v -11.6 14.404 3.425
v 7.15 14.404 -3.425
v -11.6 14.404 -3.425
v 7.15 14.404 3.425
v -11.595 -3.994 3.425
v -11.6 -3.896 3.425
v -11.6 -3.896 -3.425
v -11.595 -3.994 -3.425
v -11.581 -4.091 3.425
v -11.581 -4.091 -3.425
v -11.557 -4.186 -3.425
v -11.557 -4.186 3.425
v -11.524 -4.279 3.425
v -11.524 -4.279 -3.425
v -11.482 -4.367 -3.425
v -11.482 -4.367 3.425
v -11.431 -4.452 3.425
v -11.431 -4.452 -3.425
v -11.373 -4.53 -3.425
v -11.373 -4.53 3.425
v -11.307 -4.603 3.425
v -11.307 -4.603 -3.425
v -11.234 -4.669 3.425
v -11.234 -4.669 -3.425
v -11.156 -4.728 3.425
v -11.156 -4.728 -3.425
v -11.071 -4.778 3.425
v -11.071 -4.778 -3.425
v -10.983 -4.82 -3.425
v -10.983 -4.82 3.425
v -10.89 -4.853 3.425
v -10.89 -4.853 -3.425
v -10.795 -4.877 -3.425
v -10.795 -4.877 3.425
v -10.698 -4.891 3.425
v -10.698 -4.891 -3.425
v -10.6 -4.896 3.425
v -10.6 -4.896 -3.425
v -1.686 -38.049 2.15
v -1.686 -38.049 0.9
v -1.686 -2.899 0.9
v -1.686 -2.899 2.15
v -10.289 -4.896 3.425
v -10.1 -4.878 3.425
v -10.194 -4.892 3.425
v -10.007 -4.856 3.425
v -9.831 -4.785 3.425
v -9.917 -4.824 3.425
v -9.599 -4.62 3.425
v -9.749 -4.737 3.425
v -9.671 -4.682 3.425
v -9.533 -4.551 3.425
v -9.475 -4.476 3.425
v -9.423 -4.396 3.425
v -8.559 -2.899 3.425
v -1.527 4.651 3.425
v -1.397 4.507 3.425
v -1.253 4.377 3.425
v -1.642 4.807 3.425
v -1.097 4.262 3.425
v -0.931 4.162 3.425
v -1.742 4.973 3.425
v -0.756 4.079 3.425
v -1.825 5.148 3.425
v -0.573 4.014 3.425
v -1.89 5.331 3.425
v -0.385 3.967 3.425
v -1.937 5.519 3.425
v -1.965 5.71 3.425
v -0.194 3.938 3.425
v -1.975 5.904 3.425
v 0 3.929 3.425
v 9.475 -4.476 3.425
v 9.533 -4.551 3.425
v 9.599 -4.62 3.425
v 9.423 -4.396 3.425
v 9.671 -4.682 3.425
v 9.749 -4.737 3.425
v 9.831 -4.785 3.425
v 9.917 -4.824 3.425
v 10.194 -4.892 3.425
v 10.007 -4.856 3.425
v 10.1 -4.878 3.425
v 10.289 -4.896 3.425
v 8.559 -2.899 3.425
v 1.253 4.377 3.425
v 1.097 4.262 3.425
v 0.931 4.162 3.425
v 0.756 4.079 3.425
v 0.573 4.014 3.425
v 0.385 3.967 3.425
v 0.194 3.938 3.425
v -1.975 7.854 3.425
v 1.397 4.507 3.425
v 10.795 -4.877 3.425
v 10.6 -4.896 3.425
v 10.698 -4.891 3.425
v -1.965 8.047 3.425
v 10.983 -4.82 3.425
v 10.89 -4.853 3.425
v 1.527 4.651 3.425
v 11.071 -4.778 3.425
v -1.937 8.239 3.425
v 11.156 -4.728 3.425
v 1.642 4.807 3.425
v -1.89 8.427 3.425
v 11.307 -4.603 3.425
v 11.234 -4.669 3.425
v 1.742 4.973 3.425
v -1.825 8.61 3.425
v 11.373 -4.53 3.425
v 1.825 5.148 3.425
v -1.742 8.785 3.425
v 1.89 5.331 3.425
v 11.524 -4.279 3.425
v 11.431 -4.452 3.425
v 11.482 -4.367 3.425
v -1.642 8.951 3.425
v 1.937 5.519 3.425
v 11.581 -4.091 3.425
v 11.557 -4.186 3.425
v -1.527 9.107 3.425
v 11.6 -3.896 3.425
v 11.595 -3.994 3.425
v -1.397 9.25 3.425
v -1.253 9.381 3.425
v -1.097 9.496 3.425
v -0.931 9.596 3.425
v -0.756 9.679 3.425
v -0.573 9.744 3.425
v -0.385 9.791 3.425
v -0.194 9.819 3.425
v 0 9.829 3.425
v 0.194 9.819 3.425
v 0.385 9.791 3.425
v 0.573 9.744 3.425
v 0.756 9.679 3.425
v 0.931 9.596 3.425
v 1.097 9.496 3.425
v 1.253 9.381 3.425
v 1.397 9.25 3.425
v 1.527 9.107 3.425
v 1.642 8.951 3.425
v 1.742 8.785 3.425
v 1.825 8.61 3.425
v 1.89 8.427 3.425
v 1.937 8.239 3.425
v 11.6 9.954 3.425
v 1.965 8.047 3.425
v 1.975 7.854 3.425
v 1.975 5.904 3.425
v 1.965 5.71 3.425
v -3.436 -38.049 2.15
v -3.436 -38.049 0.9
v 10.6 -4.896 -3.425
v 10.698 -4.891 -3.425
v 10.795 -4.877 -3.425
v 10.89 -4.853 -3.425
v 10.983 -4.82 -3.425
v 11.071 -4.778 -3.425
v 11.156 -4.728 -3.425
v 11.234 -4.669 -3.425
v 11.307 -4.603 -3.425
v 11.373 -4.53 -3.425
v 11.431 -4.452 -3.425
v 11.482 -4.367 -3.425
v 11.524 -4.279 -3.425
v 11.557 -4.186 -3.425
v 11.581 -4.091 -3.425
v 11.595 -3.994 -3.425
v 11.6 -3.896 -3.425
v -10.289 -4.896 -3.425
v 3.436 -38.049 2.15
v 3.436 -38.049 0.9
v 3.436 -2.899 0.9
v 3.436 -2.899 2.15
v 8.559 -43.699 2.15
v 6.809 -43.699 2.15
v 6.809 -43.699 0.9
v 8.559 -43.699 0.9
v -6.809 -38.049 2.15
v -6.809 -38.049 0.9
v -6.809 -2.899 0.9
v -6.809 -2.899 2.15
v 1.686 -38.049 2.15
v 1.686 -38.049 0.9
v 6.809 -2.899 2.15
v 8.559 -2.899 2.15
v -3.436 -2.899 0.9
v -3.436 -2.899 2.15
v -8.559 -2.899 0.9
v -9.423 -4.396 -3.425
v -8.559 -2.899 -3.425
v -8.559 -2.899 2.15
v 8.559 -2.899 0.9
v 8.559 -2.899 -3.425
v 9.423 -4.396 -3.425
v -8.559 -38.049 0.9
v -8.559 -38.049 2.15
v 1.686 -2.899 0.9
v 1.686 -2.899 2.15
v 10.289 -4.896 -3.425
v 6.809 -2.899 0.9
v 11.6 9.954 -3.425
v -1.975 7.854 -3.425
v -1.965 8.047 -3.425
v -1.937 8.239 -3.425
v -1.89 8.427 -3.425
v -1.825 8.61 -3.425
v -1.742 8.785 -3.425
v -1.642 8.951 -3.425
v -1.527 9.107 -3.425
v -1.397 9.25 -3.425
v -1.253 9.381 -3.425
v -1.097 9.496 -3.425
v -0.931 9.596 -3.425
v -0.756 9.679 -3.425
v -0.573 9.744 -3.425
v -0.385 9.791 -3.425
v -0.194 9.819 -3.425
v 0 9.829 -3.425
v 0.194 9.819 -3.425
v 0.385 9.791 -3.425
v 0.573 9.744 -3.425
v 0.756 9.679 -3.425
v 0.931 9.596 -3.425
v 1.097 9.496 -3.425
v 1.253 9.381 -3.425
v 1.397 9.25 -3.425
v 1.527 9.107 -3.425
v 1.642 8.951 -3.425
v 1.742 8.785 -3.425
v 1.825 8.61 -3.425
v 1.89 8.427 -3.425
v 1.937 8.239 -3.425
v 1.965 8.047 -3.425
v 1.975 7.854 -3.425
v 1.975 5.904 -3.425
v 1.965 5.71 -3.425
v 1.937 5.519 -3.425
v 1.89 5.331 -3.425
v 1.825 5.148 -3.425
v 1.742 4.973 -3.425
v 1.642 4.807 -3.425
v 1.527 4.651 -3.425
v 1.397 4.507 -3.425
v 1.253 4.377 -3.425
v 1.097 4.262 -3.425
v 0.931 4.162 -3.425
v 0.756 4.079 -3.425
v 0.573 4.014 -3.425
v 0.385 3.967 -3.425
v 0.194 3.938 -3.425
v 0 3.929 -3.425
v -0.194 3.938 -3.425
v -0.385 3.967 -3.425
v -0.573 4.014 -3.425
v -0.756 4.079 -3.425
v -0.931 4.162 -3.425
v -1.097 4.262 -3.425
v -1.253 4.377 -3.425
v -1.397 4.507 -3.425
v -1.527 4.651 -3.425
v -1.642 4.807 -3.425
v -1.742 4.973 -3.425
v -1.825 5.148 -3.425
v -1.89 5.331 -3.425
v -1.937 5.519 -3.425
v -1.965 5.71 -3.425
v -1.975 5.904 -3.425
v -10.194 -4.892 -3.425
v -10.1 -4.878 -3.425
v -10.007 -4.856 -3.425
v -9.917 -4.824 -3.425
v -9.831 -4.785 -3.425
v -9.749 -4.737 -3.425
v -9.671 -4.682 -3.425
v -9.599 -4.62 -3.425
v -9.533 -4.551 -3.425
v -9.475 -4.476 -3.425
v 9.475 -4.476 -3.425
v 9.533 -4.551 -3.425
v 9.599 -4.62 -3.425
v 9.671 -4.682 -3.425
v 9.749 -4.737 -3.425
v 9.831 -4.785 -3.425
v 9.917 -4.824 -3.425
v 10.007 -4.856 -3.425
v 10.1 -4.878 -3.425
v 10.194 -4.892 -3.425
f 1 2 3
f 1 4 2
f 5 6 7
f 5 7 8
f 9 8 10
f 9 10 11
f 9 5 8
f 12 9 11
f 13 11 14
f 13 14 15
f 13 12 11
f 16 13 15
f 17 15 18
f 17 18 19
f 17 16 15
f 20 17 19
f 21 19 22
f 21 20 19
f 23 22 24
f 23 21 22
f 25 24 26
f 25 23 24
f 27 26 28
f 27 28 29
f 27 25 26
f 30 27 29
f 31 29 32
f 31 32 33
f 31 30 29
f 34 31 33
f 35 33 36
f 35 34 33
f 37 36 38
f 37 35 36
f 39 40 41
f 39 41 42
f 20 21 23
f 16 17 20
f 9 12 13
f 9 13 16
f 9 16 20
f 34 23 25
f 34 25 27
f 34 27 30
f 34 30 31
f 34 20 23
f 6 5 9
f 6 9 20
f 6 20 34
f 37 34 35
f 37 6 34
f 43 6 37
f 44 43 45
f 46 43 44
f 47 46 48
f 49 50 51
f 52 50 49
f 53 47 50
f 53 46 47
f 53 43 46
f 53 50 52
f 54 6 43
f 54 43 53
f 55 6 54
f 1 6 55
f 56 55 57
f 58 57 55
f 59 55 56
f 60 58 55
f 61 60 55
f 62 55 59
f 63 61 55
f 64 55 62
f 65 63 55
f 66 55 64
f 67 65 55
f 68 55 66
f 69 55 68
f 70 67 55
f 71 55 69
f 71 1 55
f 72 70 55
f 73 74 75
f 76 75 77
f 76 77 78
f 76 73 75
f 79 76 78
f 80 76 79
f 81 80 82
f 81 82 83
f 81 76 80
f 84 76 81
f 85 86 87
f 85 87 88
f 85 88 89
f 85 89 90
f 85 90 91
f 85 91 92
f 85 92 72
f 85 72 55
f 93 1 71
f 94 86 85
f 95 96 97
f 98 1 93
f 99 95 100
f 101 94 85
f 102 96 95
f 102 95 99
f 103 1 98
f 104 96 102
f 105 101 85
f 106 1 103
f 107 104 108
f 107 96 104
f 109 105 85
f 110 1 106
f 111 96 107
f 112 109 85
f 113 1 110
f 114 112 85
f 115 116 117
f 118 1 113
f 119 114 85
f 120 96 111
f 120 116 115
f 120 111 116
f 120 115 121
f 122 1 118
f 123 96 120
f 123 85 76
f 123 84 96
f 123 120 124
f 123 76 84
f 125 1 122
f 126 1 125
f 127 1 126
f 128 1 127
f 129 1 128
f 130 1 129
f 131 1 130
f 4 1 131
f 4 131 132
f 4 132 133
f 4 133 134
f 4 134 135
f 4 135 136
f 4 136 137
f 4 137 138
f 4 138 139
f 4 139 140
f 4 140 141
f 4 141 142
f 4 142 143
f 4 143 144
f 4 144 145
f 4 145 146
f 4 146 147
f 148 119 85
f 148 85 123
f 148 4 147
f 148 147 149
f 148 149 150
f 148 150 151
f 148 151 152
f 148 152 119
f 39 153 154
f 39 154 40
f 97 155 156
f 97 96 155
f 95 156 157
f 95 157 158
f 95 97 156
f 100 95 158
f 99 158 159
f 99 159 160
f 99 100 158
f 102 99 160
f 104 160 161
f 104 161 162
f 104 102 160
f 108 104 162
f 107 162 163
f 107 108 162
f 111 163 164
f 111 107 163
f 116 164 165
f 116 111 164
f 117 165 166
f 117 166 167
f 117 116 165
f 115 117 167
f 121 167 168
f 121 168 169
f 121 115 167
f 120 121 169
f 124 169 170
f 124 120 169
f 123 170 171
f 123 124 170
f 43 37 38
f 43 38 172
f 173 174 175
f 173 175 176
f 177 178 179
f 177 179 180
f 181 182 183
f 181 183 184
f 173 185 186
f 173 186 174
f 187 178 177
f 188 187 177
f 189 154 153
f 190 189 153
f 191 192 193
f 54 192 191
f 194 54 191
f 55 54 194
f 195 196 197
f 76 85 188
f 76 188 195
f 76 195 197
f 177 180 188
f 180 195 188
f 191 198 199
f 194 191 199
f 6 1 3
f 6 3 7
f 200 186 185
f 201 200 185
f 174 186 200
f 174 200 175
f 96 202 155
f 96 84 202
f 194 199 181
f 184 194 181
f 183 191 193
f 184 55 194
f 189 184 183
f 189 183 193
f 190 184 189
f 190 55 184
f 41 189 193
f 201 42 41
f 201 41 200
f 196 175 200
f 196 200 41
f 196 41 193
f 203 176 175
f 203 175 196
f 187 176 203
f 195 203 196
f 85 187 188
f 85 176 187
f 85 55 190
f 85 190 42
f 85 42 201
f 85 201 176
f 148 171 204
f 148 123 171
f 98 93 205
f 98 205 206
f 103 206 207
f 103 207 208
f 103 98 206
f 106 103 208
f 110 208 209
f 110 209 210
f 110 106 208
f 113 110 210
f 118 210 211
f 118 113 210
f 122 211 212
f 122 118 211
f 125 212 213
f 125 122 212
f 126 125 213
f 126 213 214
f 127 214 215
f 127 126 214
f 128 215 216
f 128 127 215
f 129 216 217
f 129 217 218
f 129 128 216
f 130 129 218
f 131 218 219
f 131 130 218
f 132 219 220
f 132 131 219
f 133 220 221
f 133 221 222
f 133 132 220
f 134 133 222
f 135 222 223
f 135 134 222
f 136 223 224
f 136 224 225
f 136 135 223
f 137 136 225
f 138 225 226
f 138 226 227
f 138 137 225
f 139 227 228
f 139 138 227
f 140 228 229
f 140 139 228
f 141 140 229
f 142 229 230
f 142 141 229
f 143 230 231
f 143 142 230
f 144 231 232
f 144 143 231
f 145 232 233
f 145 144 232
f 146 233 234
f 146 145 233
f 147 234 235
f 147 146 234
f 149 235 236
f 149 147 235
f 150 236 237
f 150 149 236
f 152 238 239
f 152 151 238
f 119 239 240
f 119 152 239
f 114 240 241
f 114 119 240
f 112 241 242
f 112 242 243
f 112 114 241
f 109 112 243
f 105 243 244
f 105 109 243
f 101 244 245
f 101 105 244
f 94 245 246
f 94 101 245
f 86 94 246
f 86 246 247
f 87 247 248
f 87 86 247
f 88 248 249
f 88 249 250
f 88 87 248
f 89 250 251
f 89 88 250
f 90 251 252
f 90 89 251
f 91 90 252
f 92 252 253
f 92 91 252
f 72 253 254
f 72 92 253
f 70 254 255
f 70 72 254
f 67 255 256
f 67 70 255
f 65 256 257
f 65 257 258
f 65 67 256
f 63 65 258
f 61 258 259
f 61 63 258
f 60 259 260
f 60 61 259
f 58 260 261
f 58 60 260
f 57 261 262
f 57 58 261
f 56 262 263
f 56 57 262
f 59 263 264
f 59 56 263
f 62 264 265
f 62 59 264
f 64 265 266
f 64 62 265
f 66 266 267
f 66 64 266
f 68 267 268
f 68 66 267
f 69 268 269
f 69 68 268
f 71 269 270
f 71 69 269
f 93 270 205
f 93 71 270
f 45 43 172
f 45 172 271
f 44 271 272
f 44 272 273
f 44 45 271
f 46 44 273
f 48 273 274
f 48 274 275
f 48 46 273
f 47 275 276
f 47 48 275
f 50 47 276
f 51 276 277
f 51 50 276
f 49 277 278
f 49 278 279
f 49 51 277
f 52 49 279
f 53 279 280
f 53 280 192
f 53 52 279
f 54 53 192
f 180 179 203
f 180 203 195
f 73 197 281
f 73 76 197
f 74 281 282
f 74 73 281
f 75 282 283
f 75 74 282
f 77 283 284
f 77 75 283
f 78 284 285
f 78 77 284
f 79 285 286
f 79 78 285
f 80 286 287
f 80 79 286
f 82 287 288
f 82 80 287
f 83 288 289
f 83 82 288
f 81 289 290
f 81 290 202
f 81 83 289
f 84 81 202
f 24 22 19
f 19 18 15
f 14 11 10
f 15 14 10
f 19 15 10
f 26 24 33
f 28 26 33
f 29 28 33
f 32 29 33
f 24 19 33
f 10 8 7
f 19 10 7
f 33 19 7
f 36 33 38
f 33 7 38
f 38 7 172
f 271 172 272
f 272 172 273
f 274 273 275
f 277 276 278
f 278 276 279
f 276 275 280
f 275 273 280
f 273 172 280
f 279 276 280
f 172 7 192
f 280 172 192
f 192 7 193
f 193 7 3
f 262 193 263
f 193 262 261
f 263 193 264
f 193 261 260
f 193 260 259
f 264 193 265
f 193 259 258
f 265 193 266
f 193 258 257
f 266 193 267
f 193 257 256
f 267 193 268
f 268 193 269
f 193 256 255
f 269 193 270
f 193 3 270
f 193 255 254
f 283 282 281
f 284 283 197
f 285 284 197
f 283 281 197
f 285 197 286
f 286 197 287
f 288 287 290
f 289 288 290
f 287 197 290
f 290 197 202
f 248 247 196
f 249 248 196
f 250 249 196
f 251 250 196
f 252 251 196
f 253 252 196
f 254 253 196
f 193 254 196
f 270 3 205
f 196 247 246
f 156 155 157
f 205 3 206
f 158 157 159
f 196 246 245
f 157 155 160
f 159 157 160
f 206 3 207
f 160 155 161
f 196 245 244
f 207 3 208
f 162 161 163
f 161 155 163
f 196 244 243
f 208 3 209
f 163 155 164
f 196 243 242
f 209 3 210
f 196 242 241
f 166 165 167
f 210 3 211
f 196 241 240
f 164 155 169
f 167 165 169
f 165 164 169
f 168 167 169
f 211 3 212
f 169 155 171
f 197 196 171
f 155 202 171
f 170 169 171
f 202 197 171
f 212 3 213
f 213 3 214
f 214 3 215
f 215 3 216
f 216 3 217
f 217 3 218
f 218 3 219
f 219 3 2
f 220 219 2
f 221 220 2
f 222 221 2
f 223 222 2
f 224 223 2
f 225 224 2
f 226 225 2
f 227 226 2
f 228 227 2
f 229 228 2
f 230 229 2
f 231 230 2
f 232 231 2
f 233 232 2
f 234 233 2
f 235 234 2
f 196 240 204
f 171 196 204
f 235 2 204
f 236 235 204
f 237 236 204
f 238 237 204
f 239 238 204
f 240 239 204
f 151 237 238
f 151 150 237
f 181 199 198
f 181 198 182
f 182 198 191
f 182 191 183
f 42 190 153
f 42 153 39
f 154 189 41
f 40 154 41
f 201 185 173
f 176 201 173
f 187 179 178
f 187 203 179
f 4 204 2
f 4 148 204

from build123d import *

# Parameters (mm, degrees)
BOSS_EXTRUDE1_DEPTH = 3.425
SKETCH2_W           = 1.75
SKETCH2_H           = 1.25
BOSS_EXTRUDE2_DEPTH = 35.15
SKETCH3_W           = 1.75
SKETCH3_H           = 1.25
BOSS_EXTRUDE3_DEPTH = 5.65


with BuildPart() as part:
    # Sketch1 → Boss-Extrude1 (new, symmetric)
    with BuildSketch(Plane.XY):
        with BuildLine():
            Line((7.15, 14.403910503), (-11.6, 14.403910503))
            Line((-11.6, 14.403910503), (-11.6, -2.896089497))
            Line((-11.6, -2.896089497), (-11.6, -3.896089497))
            ThreePointArc((-11.6, -3.896089497), (-11.307106781, -4.603196278), (-10.6, -4.896089497))
            Line((-10.6, -4.896089497), (-10.28914747, -4.896089497))
            ThreePointArc((-10.28914747, -4.896089497), (-9.78914747, -4.762114901), (-9.423122066, -4.396089497))
            Line((-9.423122066, -4.396089497), (-8.558813185, -2.899062602))
            Line((-8.558813185, -2.899062602), (8.558813185, -2.899062602))
            Line((8.558813185, -2.899062602), (9.423122066, -4.396089497))
            ThreePointArc((9.423122066, -4.396089497), (9.78914747, -4.762114901), (10.28914747, -4.896089497))
            Line((10.28914747, -4.896089497), (10.6, -4.896089497))
            ThreePointArc((10.6, -4.896089497), (11.307106781, -4.603196278), (11.6, -3.896089497))
            Line((11.6, -3.896089497), (11.6, -2.896089497))
            Line((11.6, -2.896089497), (11.6, 9.953910503))
            Line((11.6, 9.953910503), (7.15, 14.403910503))
        make_face()
        with BuildLine():
            ThreePointArc((-1.975, 7.853910503), (0, 9.828910503), (1.975, 7.853910503))
            Line((1.975, 7.853910503), (1.975, 5.903910503))
            ThreePointArc((1.975, 5.903910503), (0, 3.928910503), (-1.975, 5.903910503))
            Line((-1.975, 5.903910503), (-1.975, 7.853910503))
        make_face(mode=Mode.SUBTRACT)
    extrude(amount=BOSS_EXTRUDE1_DEPTH, both=True)

    # Sketch2 → Boss-Extrude2 (add)
    with BuildSketch(Plane.XZ.offset(2.899062602)):
        with Locations((-7.683813185, 1.525)):
            Rectangle(SKETCH2_W, SKETCH2_H)
        with Locations((-2.561271062, 1.525)):
            Rectangle(SKETCH2_W, SKETCH2_H)
        with Locations((2.561271062, 1.525)):
            Rectangle(SKETCH2_W, SKETCH2_H)
        with Locations((7.683813185, 1.525)):
            Rectangle(SKETCH2_W, SKETCH2_H)
    extrude(amount=BOSS_EXTRUDE2_DEPTH)

    # Sketch3 → Boss-Extrude3 (add)
    with BuildSketch(Plane.XZ.offset(38.049062602)):
        with Locations((7.683813185, 1.525)):
            Rectangle(SKETCH3_W, SKETCH3_H)
    extrude(amount=BOSS_EXTRUDE3_DEPTH)


solid = part.part
